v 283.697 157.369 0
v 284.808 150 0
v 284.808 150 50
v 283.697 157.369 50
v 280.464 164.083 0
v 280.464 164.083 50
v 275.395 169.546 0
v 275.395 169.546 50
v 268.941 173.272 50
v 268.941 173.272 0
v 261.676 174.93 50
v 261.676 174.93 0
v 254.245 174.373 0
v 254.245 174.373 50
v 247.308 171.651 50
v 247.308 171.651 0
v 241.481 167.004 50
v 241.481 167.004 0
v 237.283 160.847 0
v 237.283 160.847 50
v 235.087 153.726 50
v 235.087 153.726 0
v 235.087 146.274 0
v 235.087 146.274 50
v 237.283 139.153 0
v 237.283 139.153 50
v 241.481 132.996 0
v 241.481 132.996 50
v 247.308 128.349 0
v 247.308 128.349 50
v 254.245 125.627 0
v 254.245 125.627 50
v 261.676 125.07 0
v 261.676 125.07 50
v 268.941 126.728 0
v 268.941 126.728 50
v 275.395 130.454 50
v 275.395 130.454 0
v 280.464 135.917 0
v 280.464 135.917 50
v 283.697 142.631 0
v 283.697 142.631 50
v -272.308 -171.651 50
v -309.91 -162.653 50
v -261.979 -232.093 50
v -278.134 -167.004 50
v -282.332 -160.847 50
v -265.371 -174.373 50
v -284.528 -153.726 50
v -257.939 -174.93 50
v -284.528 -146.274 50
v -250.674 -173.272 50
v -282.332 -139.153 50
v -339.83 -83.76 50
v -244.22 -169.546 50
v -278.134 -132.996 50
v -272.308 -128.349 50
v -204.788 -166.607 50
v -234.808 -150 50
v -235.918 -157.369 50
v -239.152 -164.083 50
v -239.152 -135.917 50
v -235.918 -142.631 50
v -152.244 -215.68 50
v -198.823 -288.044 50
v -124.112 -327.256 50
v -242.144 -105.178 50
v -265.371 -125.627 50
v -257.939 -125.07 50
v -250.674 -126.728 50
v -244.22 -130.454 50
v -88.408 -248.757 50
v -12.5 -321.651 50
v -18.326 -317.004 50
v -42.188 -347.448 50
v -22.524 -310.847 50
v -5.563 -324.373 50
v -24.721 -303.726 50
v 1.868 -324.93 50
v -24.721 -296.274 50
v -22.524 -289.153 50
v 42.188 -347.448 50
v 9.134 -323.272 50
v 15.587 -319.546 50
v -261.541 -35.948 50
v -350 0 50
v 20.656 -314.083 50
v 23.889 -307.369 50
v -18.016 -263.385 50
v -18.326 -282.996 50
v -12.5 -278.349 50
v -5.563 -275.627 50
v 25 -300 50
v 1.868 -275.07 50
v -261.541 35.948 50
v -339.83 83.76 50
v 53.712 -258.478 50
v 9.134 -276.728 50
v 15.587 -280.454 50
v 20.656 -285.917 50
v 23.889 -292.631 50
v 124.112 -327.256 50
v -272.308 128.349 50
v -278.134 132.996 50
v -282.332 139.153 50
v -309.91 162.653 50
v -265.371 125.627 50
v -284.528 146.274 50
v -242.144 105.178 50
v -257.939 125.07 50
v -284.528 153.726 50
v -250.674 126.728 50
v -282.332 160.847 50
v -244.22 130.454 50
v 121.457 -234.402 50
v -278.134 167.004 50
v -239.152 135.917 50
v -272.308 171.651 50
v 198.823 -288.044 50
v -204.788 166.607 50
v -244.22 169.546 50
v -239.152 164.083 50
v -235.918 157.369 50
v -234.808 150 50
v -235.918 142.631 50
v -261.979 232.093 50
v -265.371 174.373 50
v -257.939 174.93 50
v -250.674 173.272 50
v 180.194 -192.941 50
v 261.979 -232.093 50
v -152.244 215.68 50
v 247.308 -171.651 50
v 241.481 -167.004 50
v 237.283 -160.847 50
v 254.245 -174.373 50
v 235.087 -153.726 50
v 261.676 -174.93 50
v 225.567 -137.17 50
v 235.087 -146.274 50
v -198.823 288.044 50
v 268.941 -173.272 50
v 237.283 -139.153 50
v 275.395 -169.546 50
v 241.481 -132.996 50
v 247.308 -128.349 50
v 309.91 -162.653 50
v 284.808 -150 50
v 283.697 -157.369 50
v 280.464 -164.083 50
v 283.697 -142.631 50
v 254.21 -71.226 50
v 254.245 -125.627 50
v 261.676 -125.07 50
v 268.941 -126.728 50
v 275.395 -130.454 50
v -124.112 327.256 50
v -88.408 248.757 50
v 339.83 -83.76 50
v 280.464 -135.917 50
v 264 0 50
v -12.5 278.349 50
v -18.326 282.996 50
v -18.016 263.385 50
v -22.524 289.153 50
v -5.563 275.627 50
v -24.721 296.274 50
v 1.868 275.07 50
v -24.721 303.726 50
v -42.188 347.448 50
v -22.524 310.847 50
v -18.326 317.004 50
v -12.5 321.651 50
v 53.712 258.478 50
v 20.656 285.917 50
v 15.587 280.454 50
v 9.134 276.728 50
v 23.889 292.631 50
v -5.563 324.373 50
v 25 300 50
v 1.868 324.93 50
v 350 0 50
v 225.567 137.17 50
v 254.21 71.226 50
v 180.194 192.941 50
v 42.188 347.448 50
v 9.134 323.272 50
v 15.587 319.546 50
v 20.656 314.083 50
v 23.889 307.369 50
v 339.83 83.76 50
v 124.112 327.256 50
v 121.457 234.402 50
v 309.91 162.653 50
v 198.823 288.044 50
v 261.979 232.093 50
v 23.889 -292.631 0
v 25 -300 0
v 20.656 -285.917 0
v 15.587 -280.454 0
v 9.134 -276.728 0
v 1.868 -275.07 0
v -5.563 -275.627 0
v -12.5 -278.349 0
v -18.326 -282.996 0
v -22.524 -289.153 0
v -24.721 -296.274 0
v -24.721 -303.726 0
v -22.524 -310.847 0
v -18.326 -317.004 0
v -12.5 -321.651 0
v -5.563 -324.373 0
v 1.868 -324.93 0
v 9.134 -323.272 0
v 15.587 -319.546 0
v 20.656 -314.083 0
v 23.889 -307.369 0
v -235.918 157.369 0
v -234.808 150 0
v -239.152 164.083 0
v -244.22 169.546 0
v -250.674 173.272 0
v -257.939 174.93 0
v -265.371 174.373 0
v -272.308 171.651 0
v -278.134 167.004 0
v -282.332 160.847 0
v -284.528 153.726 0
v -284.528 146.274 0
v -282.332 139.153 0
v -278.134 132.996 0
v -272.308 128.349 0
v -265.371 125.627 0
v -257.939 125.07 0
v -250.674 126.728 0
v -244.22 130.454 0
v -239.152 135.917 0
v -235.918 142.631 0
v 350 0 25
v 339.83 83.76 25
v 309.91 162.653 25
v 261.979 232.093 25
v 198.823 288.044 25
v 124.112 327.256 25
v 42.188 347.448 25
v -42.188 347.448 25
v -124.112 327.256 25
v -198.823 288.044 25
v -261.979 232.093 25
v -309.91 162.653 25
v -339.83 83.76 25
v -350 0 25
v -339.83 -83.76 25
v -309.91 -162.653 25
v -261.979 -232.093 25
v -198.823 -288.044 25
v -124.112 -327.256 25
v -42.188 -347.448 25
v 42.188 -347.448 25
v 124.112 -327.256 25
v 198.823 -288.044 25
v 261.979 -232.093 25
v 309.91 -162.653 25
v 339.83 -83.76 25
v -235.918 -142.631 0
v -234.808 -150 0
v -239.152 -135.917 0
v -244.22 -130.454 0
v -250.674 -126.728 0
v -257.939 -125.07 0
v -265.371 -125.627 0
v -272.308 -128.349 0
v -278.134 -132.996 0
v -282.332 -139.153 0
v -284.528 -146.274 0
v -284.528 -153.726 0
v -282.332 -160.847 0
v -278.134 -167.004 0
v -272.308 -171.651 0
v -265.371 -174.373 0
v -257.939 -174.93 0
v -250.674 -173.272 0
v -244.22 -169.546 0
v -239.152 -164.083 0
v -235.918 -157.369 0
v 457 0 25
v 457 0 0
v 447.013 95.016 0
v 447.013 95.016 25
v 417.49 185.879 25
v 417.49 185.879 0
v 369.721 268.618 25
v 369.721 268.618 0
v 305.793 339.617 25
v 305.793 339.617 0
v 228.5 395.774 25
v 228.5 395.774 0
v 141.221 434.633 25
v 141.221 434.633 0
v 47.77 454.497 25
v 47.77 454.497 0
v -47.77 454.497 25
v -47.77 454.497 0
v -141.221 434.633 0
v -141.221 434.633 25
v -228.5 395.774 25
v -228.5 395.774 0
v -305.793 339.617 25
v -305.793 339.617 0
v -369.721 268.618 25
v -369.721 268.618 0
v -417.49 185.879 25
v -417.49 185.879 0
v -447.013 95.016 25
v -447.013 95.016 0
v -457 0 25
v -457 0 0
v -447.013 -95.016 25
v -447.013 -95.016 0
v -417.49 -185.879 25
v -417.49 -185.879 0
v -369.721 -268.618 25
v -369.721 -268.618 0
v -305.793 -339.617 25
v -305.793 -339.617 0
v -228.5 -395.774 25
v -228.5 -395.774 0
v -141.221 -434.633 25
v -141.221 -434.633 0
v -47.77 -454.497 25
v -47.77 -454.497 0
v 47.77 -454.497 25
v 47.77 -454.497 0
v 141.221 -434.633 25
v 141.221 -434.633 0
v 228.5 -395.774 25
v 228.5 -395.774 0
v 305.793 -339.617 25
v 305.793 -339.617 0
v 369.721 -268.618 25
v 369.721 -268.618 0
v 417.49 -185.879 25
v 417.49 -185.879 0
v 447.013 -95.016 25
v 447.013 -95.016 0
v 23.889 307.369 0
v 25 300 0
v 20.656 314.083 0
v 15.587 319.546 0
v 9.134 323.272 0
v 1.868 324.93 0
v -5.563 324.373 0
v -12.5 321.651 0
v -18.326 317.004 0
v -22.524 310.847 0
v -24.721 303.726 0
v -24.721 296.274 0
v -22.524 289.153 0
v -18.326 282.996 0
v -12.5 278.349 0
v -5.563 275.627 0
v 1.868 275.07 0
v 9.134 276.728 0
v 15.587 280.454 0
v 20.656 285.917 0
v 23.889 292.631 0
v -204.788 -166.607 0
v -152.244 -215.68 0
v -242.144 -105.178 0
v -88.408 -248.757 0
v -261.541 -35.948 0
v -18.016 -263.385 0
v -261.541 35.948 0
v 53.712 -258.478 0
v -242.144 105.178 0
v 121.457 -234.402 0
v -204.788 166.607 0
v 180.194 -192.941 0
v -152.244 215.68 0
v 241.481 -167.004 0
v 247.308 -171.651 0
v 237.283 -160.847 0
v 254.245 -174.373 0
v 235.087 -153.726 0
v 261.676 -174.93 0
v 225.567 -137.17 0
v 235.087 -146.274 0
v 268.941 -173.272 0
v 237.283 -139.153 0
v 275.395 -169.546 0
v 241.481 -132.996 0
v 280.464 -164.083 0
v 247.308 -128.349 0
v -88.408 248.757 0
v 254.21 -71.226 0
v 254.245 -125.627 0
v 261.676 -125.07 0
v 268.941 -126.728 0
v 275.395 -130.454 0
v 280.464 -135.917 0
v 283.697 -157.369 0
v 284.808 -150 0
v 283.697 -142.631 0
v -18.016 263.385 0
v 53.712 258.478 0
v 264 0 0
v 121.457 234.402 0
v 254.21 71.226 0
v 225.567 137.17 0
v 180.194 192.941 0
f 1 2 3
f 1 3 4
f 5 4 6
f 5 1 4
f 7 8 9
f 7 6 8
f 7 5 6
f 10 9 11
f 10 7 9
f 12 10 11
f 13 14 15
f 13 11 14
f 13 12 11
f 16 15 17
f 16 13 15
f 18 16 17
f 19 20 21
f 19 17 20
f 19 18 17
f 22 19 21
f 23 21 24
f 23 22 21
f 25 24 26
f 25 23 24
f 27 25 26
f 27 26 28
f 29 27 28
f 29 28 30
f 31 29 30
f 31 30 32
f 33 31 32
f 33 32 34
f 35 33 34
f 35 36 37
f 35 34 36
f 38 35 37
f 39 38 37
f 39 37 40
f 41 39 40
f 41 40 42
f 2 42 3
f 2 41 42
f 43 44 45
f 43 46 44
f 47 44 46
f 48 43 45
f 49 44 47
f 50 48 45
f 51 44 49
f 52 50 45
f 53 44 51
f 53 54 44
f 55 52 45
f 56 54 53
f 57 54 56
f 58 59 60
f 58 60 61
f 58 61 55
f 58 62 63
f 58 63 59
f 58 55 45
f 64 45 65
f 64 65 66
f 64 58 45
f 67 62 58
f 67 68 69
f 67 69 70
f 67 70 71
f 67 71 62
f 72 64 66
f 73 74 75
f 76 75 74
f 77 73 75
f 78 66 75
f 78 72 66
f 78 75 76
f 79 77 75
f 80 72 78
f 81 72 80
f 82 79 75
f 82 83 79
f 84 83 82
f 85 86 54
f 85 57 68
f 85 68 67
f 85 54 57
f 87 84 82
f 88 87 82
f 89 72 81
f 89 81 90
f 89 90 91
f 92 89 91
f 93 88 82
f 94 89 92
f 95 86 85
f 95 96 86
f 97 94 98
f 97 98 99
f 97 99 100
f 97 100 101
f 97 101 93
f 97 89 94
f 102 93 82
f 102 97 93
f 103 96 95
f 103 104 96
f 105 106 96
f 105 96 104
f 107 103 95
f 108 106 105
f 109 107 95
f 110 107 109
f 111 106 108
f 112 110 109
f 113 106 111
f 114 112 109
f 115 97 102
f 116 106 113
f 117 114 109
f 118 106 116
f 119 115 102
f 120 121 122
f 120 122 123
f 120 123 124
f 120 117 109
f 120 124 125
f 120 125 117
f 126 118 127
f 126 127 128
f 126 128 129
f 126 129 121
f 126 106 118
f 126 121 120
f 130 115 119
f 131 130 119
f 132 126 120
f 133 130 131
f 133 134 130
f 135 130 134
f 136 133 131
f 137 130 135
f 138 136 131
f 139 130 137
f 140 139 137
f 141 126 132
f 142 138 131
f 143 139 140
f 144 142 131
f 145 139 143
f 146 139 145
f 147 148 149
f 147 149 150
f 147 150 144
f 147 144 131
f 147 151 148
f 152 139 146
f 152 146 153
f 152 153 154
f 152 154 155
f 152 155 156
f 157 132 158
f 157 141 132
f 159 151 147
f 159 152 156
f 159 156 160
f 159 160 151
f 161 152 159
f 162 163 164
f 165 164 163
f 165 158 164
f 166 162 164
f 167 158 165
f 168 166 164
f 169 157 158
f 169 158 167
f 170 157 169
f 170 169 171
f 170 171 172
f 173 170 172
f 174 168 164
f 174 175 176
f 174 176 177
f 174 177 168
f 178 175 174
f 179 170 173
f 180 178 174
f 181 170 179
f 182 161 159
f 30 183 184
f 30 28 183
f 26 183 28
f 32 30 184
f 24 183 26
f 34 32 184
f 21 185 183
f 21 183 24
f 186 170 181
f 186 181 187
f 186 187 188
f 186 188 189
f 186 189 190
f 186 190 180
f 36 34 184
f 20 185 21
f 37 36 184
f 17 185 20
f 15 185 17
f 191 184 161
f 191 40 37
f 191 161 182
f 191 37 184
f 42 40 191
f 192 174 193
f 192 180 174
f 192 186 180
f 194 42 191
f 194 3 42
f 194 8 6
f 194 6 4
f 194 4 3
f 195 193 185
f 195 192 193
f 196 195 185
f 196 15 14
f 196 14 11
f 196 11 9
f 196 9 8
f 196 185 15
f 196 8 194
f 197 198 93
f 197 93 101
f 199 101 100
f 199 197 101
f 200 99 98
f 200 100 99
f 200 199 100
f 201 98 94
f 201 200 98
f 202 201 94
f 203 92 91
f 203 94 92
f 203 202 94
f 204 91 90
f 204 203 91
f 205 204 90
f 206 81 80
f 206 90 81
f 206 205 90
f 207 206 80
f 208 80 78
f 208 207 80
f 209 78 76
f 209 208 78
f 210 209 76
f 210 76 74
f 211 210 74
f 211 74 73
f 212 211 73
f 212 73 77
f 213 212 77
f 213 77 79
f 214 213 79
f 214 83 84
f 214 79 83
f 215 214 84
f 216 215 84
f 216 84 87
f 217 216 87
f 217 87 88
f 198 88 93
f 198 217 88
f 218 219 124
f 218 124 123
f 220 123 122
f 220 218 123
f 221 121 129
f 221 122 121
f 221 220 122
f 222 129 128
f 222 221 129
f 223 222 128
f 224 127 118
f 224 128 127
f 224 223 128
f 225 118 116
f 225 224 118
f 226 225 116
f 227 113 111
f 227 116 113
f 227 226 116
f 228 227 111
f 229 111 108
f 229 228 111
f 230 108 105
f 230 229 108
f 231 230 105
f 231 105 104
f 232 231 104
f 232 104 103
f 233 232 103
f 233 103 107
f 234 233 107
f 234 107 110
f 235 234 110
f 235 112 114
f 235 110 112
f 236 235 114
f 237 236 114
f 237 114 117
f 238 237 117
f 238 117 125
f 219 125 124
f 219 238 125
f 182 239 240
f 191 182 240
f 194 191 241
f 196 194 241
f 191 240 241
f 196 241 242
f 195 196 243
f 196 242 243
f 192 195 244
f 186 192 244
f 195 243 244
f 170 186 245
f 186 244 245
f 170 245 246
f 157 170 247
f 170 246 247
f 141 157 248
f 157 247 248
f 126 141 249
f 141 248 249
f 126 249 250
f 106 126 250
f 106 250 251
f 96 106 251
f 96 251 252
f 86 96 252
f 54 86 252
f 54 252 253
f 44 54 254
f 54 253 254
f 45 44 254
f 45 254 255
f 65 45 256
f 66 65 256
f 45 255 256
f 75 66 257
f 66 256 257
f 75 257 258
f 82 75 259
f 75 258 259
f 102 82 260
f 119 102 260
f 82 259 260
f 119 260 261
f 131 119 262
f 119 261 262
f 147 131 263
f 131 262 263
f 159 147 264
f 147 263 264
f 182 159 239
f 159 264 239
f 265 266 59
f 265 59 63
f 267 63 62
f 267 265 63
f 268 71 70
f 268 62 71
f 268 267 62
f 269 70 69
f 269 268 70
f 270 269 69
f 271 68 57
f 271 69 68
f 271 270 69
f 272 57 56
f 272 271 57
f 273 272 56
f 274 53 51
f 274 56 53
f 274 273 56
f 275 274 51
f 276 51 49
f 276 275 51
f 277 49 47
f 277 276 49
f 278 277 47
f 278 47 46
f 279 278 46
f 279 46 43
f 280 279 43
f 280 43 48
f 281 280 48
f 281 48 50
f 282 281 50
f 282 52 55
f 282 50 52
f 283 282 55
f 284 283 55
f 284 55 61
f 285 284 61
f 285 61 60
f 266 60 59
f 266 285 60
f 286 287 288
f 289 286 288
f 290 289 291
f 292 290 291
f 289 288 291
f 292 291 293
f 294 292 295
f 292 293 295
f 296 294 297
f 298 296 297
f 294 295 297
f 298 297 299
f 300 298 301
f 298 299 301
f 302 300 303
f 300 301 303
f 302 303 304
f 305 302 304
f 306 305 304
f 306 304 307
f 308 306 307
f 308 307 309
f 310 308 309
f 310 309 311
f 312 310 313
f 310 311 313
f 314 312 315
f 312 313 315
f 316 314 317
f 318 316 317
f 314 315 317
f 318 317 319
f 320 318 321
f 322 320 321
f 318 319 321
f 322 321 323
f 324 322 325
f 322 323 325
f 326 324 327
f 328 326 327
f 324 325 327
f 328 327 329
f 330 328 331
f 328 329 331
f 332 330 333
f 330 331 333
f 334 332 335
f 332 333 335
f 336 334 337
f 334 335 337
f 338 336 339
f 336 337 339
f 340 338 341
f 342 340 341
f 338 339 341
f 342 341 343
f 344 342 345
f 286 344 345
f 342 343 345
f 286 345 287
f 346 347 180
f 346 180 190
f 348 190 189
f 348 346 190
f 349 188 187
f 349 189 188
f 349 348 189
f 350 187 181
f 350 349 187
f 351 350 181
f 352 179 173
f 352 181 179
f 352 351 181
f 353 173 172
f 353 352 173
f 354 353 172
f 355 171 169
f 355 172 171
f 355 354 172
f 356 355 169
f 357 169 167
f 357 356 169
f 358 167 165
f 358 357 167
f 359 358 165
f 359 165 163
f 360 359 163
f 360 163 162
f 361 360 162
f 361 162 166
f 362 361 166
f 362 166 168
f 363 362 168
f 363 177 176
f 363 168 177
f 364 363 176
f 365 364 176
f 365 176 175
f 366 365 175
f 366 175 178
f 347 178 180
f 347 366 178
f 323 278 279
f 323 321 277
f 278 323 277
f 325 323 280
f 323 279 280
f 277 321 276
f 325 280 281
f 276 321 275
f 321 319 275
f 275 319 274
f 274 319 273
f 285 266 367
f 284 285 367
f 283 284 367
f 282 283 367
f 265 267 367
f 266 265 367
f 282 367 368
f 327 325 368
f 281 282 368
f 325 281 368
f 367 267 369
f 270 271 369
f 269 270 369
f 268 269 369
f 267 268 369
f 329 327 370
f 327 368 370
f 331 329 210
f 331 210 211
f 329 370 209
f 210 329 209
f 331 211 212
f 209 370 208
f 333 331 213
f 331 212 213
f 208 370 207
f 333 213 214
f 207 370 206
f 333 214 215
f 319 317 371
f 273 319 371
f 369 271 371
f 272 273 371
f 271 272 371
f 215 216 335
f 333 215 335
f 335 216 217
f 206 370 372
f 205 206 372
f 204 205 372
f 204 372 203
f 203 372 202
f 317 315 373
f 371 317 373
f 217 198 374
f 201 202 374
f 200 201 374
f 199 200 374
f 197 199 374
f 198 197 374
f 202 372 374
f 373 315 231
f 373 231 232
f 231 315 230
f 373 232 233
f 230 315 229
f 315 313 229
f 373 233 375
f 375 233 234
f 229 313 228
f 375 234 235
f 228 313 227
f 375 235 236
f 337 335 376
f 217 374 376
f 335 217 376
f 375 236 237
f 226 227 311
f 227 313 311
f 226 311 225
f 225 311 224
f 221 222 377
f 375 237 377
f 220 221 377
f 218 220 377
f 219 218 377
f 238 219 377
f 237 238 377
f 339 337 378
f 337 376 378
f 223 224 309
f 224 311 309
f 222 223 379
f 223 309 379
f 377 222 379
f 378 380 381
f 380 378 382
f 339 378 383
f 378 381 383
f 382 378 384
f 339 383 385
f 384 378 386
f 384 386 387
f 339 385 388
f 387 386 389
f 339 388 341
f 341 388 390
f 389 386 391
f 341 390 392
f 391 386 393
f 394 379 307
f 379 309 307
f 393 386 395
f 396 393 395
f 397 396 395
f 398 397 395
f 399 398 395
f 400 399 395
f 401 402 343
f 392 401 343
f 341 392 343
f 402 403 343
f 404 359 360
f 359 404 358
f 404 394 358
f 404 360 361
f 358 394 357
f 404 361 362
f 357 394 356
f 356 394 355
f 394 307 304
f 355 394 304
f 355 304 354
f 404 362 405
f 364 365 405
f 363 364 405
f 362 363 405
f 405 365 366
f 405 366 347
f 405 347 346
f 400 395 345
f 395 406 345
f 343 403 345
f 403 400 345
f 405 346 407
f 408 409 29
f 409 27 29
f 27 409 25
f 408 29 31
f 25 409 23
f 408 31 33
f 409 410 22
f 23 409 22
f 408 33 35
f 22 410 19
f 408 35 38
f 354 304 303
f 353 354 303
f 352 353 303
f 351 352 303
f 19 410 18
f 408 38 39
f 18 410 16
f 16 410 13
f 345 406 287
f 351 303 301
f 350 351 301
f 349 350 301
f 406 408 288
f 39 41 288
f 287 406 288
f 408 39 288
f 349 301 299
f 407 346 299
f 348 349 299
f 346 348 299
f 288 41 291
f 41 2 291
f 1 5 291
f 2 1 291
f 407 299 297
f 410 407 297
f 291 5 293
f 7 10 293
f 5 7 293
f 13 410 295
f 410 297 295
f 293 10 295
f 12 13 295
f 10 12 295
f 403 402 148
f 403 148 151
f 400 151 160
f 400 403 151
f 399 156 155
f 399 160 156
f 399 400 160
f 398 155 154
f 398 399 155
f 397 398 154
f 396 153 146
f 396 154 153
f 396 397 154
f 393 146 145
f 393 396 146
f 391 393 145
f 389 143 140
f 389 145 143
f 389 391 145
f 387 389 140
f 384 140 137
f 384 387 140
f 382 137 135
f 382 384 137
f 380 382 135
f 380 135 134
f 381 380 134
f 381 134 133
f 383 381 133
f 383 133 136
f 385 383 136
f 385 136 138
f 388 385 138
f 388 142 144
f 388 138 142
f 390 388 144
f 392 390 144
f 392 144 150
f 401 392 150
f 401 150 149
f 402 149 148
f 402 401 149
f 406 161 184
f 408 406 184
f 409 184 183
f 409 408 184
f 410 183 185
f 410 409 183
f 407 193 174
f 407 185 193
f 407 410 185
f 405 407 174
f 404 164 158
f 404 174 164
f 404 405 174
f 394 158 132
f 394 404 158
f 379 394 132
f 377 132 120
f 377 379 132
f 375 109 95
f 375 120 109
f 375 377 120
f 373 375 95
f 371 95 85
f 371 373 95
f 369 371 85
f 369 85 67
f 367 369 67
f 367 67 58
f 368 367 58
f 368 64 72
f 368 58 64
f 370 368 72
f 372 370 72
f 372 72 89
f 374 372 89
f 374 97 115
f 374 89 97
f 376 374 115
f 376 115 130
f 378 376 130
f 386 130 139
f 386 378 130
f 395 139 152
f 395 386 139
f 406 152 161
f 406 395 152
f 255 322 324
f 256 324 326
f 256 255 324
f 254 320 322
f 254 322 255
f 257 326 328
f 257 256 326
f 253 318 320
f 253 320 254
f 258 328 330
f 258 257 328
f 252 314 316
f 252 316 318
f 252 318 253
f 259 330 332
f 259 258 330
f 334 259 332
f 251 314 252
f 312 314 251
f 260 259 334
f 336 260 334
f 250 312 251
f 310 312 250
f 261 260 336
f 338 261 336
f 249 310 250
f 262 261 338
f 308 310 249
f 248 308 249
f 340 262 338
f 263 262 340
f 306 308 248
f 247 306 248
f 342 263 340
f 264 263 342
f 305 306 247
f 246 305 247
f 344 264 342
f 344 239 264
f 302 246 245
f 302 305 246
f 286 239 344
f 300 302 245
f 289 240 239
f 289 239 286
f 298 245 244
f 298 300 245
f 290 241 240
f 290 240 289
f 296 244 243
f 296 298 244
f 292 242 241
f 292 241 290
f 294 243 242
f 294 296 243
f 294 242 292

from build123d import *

# Parameters (mm, degrees)
SKETCH1_R               = 457
BOSS_EXTRUDE1_DEPTH     = 25
SKETCH2_R               = 350
BOSS_EXTRUDE2_DEPTH     = 25
CUT_EXTRUDE3_DEPTH      = 649.226812158
CUT_EXTRUDE3_DEPTH_BACK = 649.226812158
SKETCH3_R               = 25
SKETCH3_R_2             = 264


with BuildPart() as part:
    # Sketch1 → Boss-Extrude1 (new body)
    with BuildSketch(Plane.XY):
        Circle(SKETCH1_R)
    extrude(amount=BOSS_EXTRUDE1_DEPTH)

    # Sketch2 → Boss-Extrude2 (add)
    with BuildSketch(Plane.XY.offset(25)):
        Circle(SKETCH2_R)
    extrude(amount=BOSS_EXTRUDE2_DEPTH)

    # Sketch3 → Cut-Extrude3 (cut, two sides: drawn at the far end of the back side and taken through both)
    with BuildSketch(Plane.XY.offset(50).offset(-CUT_EXTRUDE3_DEPTH_BACK)):
        with Locations((0, 300)):
            Circle(SKETCH3_R)
        with Locations((259.807621135, 150)):
            Circle(SKETCH3_R)
        with Locations((259.807621135, -150)):
            Circle(SKETCH3_R)
        with Locations((0, -300)):
            Circle(SKETCH3_R)
        with Locations((-259.807621135, -150)):
            Circle(SKETCH3_R)
        with Locations((-259.807621135, 150)):
            Circle(SKETCH3_R)
        Circle(SKETCH3_R_2)
    extrude(amount=CUT_EXTRUDE3_DEPTH + CUT_EXTRUDE3_DEPTH_BACK, mode=Mode.SUBTRACT)


solid = part.part
